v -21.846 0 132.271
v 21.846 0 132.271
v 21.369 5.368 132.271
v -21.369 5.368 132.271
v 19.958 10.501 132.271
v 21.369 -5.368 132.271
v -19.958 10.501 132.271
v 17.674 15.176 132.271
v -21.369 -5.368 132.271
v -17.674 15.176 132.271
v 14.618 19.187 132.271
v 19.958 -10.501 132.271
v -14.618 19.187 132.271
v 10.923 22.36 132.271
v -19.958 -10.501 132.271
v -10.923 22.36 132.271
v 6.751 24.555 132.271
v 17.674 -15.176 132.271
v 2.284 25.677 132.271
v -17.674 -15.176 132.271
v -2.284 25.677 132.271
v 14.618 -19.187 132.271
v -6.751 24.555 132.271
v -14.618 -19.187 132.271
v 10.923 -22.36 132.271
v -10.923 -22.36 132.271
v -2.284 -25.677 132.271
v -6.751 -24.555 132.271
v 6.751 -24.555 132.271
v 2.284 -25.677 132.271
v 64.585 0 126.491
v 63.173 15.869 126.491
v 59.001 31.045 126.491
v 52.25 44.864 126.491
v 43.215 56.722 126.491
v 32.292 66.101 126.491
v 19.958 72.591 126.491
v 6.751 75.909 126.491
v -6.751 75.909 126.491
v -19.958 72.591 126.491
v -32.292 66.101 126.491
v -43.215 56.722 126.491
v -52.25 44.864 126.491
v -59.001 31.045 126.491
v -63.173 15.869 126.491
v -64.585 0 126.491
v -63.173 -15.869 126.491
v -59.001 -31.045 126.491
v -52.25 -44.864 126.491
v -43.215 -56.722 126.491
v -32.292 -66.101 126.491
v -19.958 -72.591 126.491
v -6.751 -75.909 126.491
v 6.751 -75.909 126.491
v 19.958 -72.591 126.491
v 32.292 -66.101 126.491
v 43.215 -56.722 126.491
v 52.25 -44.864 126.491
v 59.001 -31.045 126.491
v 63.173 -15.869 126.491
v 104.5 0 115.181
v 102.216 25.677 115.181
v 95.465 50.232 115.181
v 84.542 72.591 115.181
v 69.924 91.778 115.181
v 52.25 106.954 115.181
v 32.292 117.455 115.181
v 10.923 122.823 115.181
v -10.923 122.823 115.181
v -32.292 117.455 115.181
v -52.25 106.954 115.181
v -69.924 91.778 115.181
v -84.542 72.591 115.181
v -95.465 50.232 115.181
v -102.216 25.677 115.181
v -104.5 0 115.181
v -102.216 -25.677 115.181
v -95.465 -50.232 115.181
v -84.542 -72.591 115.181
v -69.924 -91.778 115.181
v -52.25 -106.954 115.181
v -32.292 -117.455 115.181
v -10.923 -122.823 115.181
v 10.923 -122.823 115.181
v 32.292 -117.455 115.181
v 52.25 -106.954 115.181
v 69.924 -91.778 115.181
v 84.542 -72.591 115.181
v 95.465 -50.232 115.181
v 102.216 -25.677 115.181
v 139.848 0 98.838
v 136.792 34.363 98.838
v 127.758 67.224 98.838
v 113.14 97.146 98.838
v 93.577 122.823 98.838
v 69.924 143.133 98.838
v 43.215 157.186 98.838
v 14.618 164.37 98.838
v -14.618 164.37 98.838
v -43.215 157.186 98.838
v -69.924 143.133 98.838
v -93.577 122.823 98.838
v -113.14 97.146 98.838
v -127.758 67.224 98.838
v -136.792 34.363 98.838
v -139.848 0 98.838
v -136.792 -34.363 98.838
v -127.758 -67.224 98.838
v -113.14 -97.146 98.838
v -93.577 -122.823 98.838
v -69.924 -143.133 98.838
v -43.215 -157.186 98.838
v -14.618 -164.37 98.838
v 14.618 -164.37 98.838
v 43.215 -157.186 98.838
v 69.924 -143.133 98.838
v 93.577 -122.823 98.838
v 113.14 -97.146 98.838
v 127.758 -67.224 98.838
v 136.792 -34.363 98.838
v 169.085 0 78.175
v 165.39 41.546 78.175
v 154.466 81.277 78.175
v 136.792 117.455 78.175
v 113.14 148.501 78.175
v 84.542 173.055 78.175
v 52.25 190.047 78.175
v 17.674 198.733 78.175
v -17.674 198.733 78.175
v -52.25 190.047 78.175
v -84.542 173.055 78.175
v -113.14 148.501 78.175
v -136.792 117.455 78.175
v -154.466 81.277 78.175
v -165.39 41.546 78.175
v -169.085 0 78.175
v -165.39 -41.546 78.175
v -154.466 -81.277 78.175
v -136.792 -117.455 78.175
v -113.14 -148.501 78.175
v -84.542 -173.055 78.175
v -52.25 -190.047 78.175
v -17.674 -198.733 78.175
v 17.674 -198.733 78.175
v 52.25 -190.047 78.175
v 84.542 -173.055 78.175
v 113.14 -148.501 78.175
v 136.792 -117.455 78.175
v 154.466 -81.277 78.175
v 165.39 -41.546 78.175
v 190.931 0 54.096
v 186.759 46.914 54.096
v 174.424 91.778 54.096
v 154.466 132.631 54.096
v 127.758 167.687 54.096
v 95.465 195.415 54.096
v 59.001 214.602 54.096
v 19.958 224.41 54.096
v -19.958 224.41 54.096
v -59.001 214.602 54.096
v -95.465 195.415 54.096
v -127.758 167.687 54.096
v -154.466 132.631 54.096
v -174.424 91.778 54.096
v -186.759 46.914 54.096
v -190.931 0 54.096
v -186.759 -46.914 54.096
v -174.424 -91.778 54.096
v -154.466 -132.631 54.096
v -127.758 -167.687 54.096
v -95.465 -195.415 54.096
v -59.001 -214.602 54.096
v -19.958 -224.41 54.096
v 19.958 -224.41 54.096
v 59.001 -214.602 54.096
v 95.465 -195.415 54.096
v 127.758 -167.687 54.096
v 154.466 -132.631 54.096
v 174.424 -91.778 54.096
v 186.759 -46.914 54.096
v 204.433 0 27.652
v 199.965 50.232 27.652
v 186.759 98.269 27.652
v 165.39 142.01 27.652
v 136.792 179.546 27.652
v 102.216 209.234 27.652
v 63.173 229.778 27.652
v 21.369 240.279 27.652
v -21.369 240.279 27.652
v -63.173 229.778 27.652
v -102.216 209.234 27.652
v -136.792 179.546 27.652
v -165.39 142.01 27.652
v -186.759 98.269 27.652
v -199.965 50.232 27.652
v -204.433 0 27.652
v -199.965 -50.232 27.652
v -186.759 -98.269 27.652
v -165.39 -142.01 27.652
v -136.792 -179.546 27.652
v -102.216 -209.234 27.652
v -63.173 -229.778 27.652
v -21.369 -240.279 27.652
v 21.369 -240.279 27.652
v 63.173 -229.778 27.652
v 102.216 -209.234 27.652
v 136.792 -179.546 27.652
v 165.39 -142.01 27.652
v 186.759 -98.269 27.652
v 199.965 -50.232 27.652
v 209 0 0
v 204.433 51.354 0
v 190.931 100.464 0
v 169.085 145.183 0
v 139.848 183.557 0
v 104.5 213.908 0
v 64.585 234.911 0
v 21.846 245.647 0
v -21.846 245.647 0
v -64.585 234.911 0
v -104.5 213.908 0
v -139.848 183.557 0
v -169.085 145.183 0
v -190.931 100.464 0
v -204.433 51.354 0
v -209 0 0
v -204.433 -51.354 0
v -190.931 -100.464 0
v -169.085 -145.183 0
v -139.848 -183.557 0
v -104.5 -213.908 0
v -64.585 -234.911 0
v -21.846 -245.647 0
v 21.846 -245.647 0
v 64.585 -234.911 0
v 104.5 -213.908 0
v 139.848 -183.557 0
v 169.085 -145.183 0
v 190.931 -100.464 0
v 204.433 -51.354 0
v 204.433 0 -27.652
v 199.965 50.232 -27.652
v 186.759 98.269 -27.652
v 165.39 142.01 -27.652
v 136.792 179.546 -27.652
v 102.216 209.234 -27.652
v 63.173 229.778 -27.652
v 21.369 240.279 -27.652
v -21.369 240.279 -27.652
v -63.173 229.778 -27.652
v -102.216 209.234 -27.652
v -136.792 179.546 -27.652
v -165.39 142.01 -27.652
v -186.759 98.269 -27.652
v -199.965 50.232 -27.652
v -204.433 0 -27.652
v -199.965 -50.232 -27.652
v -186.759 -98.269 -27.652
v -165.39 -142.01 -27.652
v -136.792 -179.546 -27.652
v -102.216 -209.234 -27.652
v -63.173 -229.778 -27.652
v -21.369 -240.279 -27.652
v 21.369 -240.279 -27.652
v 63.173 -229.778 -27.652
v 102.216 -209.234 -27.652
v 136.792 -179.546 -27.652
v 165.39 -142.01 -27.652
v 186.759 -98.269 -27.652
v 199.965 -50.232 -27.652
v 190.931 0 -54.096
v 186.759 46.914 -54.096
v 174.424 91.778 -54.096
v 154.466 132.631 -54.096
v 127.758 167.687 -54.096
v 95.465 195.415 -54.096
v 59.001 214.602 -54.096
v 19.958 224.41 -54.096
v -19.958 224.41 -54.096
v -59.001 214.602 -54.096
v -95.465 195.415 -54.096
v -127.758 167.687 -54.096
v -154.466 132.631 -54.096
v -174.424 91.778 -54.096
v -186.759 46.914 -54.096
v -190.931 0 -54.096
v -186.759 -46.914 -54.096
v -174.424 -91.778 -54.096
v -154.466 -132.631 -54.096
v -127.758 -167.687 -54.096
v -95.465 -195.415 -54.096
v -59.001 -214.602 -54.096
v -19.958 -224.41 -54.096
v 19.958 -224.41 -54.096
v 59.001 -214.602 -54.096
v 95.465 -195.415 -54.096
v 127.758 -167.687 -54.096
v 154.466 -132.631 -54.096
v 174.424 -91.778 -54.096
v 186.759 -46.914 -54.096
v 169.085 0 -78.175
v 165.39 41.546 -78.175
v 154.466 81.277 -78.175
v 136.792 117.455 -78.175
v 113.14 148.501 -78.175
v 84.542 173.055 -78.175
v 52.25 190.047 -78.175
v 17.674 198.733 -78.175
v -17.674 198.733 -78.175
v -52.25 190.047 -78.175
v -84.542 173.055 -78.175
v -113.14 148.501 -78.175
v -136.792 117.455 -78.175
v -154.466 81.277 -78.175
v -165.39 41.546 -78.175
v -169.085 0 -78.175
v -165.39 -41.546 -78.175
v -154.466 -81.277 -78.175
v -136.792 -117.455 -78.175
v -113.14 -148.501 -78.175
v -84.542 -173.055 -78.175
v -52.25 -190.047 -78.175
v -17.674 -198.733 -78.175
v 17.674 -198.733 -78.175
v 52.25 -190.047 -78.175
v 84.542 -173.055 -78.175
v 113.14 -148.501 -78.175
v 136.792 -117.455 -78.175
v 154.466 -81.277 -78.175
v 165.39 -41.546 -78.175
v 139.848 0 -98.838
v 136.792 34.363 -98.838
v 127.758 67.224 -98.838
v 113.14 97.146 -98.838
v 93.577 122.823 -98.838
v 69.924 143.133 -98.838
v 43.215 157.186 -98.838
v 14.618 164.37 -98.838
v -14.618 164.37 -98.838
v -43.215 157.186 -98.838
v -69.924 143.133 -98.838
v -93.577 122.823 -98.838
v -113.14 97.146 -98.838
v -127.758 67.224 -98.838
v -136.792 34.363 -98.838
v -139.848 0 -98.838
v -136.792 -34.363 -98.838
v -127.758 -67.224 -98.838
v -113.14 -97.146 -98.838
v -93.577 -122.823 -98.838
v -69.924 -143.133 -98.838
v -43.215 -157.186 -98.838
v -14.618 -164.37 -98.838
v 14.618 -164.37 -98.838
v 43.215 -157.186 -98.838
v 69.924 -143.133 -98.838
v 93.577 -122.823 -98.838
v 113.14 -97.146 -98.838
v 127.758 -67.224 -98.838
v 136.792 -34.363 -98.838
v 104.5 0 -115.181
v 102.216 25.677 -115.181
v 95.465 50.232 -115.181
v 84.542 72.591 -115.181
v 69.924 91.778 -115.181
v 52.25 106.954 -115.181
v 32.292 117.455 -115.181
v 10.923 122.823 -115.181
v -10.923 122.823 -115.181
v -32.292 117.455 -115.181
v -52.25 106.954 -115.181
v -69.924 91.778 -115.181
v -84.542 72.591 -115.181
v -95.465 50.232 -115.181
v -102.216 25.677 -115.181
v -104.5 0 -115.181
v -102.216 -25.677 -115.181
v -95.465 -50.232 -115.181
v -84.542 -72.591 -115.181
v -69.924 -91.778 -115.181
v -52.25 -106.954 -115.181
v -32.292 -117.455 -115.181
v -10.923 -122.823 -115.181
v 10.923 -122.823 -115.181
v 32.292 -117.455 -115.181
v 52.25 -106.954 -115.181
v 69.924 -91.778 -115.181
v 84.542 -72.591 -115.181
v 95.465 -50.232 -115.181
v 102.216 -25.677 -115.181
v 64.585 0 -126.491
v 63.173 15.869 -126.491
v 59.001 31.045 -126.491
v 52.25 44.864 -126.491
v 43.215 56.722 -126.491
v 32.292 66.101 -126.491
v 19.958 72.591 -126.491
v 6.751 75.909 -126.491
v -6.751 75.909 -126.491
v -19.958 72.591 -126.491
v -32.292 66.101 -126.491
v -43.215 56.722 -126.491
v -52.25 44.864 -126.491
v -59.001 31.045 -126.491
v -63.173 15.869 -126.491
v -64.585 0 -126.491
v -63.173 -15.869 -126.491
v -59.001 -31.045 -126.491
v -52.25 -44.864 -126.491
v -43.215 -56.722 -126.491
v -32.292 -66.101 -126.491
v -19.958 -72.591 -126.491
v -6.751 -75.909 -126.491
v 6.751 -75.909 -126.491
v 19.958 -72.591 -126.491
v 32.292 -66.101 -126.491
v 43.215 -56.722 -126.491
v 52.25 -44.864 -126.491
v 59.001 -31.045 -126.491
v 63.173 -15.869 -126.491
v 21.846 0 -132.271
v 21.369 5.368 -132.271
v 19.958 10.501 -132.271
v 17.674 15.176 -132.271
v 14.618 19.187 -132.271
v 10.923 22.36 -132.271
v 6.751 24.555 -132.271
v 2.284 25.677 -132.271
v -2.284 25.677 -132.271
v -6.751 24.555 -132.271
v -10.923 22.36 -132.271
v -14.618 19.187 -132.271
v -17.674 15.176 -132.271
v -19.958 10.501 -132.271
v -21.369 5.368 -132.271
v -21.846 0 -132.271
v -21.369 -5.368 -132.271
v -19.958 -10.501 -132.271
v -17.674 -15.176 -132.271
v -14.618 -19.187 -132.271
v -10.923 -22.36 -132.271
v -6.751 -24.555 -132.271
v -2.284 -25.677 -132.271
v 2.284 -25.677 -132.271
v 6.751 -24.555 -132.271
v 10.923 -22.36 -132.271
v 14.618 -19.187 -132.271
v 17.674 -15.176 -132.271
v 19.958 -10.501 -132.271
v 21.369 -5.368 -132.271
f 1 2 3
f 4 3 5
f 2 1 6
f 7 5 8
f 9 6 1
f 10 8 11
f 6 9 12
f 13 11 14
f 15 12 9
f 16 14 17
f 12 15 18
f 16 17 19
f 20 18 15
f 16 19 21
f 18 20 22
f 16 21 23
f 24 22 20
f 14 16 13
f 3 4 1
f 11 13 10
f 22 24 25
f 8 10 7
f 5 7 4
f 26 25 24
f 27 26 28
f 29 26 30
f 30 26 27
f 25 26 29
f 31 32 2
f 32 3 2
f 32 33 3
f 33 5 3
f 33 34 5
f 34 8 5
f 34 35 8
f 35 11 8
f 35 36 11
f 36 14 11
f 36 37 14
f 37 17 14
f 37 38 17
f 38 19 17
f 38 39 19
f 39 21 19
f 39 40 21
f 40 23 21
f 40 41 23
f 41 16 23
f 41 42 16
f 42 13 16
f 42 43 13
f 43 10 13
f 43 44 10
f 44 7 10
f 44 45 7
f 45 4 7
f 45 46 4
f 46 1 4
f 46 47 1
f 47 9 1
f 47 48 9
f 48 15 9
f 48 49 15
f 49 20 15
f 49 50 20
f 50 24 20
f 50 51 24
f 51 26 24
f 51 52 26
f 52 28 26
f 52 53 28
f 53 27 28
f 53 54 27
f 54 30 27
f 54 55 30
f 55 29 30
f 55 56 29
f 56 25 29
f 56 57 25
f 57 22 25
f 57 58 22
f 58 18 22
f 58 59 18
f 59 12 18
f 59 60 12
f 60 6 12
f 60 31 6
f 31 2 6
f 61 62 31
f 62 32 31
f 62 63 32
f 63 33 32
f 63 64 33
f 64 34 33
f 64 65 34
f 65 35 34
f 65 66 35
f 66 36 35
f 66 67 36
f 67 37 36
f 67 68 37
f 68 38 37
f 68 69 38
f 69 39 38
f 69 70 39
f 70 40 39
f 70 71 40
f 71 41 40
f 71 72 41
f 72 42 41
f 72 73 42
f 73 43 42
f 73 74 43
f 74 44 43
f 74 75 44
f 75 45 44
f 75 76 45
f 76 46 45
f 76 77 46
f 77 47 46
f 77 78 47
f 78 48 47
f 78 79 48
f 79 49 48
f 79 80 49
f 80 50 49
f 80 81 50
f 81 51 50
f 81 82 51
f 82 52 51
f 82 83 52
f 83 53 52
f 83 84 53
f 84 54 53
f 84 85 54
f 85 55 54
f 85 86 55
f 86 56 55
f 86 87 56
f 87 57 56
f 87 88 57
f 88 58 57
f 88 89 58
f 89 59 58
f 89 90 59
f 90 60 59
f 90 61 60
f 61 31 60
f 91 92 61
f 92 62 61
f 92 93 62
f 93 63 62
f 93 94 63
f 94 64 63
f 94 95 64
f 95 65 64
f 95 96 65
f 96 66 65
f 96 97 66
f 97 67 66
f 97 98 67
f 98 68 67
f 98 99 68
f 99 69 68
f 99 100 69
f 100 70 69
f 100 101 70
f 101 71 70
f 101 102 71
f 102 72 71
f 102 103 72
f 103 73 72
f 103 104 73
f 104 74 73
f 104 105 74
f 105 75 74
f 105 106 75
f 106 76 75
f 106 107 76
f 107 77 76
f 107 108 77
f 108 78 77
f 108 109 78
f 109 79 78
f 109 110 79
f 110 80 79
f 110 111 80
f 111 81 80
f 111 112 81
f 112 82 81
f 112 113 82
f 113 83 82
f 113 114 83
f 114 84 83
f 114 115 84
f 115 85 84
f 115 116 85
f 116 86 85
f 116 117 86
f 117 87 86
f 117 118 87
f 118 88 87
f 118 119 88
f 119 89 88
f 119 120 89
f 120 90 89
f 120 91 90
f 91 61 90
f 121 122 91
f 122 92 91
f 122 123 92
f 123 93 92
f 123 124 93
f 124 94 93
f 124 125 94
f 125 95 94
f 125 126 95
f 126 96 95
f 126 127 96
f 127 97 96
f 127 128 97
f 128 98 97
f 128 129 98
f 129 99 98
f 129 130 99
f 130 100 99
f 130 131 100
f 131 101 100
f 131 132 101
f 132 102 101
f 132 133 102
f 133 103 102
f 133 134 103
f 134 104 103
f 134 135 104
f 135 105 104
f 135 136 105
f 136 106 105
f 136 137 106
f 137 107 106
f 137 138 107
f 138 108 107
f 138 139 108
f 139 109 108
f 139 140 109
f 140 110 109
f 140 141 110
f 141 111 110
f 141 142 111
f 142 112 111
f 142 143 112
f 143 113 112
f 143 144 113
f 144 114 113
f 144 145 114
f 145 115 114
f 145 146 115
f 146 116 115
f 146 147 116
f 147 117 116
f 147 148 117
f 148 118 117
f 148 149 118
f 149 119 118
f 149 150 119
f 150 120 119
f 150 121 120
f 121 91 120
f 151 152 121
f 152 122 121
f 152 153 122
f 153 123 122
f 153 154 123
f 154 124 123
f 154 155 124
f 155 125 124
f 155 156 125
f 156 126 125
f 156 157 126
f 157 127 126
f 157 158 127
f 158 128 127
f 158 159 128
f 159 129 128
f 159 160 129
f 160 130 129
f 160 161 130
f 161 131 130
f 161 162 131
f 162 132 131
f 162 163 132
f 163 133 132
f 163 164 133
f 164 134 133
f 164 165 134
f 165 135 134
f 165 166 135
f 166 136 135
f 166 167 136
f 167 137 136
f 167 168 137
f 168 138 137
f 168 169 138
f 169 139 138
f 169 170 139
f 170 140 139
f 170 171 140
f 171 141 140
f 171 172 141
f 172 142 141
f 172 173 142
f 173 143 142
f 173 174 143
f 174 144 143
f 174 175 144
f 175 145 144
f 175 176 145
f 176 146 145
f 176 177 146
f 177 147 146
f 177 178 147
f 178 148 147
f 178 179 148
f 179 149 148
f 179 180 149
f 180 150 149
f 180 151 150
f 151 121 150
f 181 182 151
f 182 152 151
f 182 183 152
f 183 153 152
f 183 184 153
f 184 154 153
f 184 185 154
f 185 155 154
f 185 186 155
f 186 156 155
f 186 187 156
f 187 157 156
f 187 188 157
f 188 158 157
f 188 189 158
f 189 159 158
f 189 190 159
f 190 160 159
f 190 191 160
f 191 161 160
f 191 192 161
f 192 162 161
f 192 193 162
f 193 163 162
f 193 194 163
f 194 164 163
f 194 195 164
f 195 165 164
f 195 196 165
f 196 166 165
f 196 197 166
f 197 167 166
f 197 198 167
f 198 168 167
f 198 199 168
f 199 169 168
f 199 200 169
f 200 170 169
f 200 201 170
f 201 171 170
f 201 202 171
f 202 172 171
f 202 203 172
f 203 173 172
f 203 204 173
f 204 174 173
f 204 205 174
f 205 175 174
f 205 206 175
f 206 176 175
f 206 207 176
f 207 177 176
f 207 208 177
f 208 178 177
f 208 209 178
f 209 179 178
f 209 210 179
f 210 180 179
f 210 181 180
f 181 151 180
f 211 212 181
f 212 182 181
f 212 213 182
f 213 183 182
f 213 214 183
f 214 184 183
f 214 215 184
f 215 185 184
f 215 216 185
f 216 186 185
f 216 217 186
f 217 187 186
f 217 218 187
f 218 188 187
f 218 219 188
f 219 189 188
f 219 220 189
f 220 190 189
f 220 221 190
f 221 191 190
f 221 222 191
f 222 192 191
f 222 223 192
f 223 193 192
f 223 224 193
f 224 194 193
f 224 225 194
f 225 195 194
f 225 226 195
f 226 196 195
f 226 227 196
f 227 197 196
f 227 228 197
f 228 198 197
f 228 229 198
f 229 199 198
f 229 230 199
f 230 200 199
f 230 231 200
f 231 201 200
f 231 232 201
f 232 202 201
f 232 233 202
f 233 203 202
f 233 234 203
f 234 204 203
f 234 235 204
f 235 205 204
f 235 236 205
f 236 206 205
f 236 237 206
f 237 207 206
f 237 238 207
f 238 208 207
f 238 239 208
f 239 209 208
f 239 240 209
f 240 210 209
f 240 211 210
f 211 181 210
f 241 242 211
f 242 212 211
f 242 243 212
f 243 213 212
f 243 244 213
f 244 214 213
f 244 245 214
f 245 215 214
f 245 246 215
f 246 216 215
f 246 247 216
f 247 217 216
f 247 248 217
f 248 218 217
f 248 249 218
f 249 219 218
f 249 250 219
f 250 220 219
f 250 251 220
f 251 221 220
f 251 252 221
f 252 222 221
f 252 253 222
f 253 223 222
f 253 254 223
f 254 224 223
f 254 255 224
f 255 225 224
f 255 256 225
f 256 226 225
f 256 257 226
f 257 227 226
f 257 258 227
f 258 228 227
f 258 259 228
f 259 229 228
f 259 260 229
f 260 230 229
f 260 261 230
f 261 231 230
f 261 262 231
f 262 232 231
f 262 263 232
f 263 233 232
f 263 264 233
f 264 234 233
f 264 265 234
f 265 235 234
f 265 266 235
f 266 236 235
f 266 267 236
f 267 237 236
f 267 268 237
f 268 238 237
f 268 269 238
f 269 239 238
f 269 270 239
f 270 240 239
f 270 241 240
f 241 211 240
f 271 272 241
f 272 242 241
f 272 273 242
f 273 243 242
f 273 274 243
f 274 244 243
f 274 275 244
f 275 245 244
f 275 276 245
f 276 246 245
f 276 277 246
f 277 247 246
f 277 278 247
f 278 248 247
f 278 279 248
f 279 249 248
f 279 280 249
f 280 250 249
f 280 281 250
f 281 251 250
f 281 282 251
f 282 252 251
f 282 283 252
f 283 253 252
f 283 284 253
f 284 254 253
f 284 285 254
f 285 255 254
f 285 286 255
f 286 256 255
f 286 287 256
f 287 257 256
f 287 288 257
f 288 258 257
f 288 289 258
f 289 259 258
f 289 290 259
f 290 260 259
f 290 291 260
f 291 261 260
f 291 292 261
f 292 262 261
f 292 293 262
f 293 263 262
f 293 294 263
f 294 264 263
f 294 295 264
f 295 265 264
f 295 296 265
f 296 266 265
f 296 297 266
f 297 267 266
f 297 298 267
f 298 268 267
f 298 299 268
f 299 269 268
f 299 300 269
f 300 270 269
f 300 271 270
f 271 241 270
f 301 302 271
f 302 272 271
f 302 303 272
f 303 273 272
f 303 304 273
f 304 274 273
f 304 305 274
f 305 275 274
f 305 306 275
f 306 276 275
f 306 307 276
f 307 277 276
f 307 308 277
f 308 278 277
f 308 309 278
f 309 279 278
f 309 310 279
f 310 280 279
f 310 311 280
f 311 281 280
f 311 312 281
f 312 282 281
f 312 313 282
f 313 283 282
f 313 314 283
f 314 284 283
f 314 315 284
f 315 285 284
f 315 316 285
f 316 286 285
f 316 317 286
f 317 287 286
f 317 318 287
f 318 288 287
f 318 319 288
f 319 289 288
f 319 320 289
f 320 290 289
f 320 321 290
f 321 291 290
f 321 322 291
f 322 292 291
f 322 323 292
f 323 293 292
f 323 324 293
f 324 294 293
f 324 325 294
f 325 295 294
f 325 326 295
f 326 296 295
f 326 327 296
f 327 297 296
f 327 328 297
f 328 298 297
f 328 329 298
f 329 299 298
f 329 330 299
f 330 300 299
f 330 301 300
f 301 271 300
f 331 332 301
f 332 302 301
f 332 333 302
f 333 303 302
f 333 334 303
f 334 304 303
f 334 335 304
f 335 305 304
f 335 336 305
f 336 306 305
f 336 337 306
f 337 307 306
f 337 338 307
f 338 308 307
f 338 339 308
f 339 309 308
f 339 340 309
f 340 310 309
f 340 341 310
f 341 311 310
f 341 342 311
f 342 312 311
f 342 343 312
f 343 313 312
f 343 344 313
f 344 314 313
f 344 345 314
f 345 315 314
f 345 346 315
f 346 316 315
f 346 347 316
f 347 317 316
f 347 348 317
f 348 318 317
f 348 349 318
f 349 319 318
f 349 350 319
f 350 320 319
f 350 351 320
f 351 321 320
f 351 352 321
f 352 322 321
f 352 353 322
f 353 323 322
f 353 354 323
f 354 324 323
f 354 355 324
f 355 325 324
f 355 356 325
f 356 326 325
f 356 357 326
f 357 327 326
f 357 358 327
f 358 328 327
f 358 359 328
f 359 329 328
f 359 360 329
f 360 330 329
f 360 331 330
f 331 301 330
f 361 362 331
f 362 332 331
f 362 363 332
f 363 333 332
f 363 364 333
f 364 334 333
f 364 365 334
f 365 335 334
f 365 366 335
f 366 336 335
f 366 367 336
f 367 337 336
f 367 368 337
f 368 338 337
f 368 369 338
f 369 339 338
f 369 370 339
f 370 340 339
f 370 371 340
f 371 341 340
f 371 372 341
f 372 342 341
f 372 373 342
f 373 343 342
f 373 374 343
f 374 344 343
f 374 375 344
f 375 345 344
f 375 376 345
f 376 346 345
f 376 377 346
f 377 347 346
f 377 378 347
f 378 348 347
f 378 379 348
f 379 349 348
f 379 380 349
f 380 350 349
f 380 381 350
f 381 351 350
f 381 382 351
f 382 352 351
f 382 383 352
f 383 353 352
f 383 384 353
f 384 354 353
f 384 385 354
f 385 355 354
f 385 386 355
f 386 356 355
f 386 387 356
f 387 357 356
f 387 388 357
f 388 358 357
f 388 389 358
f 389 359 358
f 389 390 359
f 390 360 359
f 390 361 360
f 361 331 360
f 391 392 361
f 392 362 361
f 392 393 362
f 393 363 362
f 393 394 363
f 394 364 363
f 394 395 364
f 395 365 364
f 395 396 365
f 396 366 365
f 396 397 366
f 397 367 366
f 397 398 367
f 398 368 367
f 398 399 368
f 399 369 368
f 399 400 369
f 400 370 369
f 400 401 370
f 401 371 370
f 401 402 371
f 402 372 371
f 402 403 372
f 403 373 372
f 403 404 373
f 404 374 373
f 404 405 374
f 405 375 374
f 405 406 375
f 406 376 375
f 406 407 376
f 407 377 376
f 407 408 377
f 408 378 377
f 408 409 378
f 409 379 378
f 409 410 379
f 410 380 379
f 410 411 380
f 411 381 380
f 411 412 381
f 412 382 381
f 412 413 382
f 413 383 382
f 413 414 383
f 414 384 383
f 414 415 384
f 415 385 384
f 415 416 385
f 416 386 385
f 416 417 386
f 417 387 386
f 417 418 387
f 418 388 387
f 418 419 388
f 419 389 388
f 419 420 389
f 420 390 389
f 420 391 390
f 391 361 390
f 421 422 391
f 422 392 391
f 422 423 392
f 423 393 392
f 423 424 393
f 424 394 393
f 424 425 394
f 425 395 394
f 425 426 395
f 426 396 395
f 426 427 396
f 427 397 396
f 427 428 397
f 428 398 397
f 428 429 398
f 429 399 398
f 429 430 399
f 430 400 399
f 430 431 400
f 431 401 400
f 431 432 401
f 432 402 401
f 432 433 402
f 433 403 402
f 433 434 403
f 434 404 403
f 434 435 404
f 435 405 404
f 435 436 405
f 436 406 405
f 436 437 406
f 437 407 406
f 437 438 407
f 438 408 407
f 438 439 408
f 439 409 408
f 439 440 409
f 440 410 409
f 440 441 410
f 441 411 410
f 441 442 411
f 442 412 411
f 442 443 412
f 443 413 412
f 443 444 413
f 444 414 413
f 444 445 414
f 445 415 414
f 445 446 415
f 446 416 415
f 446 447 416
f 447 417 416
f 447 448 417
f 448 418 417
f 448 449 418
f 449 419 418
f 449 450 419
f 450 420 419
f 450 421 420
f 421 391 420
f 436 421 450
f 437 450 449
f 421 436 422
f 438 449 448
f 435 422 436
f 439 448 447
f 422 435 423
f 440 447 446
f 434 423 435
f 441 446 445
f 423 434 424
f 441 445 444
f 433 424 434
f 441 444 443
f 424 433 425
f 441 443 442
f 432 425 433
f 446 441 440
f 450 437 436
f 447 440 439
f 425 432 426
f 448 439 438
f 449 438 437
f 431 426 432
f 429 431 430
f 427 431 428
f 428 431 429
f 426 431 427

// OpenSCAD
// Generated by SolidPython 1.0.1 on 2020-07-29 00:46:49


scale(v = [11, 13, 7]) {
	sphere(r = 19);
}
/***********************************************
*********      SolidPython code:      **********
************************************************
 
# import packages: SolidPython
from solid import *
from solid.utils import *
from itertools import chain, combinations, permutations


class Resize:

    def __init__(self, scad_file):
        self.scad_file = scad_file
        #self.scad_file = import_scad(scad_file)
        # cone/cylinder param:
        self.r1 = 0
        self.r2 = 0
        self.h = 0
        # rectangular prism param:
        self.w = 0
        self.l = 0
        # ellipse param:
        self.r = 0

    # import OpenScad code (file name corresponds to shape)


    # classify shape + parameters
    def assign(self, param1, param2, param3):
        if self.scad_file == 'cone.scad':
            self.r1 = param1
            self.r2 = param2
            self.h = param3
        elif self.scad_file == 'cylinder.scad':
            self.r1 = param1
            self.r2 = param2
            self.h = param3
        elif self.scad_file == 'rectangularPrism.scad':
            self.h = param1
            self.l = param2
            self.w = param3
        else:
            self.r = param1
            self.h = param2

    # resize parameters
    def iterate(self):
        x = range(3, 20, 2)
        i = 1
        if self.scad_file == 'cone.scad':
            tempList = list(permutations(x, 2))
            for temp in tempList:
                param1 = temp[0]
                param2 = temp[1]
                filepath = 'produced_scad_files/' + 'cone' + str(param1) + '_' + str(param2) + '_' + '.scad'
                scad_render_to_file(cylinder(h=param1, r1=param2, r2=0), filepath)

        elif self.scad_file == 'cylinder.scad':
            tempList = list(permutations(x, 3))
            for temp in tempList:
                param1 = temp[0]
                param2 = temp[1]
                filepath = 'produced_scad_files/' + 'cylinder' + str(param1) + '_' + str(param2) + '_' + '.scad'
                scad_render_to_file(cylinder(h=param1, r1=param2, r2=param2), filepath)

        elif self.scad_file == 'rectangularPrism.scad':
            tempList = list(permutations(x, 3))
            for temp in tempList:
                param1 = temp[0]
                param2 = temp[1]
                param3 = temp[2]
                filepath = 'produced_scad_files/' + 'rectangularPrism' + str(param1) + '_' + str(param2) + '_' + str(
                    param3) + '.scad'
                scad_render_to_file(cube(size=(param1, param2, param3)), filepath)

        elif self.scad_file == 'ellipse.scad':
            tempList = list(permutations(x, 4))
            for temp in tempList:
                param1 = temp[0]
                param2 = temp[1]
                param3 = temp[2]
                param4 = temp[3]
                filepath = 'produced_scad_files/' + 'ellipse' + str(param1) + '_' + str(param2) + '_' + str(param3) + '_' + str(param4) + '.scad'
                scad_render_to_file(scale([param1, param2, param3])(sphere(r=param4)), filepath)

    def render_to_scadfile(self):
        scad_render_to_file(scad, 'example.scad') 
 
************************************************/
